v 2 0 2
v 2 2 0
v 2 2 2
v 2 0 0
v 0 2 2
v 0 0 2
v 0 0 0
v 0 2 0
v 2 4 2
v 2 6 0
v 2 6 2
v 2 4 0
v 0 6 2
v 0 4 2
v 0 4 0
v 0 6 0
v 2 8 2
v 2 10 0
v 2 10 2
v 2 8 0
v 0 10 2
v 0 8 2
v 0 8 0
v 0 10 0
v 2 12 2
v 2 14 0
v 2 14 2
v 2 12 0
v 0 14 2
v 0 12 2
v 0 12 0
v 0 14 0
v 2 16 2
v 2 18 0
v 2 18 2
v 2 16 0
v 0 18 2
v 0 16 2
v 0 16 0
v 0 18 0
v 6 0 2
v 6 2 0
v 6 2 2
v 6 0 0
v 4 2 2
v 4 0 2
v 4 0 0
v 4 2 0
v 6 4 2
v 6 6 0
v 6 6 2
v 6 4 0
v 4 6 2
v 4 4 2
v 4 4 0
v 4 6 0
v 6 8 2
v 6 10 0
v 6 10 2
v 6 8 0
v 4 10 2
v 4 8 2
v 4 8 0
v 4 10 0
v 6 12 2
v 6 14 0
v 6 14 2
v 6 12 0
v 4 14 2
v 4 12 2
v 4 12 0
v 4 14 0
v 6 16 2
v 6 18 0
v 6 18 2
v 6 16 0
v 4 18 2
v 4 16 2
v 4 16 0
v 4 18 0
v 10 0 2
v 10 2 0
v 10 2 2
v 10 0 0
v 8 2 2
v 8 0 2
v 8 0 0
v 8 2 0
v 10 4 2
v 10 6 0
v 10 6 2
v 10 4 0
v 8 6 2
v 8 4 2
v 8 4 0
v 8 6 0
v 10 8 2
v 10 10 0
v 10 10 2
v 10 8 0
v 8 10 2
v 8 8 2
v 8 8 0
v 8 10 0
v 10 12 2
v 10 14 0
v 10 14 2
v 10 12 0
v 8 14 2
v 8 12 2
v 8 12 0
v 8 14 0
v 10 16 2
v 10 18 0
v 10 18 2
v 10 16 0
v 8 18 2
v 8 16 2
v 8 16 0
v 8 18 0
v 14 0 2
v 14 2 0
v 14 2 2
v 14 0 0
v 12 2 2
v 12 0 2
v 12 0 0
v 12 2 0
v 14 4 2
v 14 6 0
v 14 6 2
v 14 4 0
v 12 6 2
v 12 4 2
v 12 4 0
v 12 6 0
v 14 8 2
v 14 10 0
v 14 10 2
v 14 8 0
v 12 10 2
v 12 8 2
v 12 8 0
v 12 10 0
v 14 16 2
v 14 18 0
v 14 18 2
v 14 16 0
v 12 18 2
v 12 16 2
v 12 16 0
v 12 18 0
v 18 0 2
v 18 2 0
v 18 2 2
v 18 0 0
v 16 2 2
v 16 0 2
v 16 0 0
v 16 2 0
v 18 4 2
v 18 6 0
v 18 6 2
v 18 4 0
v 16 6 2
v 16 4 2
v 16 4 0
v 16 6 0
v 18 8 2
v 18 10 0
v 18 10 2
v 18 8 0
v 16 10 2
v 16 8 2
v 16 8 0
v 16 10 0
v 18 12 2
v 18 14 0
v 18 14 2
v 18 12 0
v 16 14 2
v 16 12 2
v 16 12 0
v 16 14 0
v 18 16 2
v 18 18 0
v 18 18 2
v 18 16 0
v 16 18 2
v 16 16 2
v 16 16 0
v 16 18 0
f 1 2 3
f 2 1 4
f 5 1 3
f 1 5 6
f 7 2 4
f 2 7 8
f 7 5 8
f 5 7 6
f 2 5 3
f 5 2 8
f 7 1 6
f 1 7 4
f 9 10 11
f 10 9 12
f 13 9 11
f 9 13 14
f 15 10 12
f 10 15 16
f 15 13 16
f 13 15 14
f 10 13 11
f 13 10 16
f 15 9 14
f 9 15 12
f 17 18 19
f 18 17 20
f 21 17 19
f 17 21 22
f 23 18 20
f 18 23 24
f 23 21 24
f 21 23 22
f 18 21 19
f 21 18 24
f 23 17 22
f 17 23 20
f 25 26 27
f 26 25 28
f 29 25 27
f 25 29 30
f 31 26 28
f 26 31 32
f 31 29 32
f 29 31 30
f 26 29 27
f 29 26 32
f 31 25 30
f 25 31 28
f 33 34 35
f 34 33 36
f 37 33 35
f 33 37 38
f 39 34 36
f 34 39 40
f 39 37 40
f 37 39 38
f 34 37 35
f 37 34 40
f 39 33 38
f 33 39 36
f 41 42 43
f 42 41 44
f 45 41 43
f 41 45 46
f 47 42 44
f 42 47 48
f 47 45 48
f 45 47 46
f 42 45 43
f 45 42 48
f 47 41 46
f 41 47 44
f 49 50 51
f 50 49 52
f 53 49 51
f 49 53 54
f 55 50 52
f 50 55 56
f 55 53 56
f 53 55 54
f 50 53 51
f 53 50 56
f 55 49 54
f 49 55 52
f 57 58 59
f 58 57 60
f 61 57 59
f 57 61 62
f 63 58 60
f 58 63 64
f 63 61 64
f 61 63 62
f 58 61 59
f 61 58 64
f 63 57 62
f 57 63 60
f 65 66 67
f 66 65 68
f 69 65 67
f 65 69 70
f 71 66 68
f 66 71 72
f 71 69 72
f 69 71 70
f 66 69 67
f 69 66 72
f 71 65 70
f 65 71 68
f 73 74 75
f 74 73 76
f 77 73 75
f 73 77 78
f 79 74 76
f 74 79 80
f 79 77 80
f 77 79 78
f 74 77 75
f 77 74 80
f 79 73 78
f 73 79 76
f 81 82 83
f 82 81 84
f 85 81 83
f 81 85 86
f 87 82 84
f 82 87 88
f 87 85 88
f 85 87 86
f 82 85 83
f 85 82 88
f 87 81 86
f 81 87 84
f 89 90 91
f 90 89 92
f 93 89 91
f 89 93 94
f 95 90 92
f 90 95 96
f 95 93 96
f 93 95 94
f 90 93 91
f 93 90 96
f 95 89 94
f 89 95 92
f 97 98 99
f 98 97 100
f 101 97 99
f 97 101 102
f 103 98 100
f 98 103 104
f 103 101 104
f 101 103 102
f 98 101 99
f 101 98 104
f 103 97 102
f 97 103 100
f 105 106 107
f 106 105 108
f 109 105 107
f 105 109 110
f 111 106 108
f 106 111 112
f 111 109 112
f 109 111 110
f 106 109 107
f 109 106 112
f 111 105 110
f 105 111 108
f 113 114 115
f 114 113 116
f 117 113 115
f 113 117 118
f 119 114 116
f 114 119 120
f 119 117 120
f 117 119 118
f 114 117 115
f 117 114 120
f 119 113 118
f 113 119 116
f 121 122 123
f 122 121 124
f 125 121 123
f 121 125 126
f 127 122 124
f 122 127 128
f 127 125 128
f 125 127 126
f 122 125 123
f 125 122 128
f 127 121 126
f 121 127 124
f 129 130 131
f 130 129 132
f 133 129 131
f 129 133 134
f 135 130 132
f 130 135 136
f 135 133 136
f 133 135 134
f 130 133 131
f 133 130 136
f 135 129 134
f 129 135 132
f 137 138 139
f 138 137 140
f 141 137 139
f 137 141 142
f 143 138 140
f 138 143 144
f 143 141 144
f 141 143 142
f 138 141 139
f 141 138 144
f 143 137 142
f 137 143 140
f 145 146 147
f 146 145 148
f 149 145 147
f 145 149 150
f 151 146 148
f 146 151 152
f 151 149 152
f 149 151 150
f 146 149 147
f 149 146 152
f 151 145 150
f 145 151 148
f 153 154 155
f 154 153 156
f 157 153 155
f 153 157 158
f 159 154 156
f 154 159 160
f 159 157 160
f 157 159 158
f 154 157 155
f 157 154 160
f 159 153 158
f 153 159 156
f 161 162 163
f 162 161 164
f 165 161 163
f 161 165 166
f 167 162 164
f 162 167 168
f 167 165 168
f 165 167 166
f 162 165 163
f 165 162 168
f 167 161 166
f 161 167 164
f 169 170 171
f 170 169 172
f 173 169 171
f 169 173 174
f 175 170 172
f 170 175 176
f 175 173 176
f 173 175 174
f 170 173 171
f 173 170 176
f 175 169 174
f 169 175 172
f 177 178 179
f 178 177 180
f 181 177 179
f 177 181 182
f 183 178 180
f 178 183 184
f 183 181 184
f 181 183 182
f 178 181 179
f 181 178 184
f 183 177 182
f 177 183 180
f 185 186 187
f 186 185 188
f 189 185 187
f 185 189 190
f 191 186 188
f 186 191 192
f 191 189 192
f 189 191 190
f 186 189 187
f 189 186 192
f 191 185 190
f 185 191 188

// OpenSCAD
union() {
  for (ix = [0:4]) {
    for (iy = [0:4]) {
      if (!(ix == 3 && iy == 3)) {
        translate([ix * 4, iy * 4, 0]) cube(size=[2,2,2], center=false);
      }
    }
  }
}
